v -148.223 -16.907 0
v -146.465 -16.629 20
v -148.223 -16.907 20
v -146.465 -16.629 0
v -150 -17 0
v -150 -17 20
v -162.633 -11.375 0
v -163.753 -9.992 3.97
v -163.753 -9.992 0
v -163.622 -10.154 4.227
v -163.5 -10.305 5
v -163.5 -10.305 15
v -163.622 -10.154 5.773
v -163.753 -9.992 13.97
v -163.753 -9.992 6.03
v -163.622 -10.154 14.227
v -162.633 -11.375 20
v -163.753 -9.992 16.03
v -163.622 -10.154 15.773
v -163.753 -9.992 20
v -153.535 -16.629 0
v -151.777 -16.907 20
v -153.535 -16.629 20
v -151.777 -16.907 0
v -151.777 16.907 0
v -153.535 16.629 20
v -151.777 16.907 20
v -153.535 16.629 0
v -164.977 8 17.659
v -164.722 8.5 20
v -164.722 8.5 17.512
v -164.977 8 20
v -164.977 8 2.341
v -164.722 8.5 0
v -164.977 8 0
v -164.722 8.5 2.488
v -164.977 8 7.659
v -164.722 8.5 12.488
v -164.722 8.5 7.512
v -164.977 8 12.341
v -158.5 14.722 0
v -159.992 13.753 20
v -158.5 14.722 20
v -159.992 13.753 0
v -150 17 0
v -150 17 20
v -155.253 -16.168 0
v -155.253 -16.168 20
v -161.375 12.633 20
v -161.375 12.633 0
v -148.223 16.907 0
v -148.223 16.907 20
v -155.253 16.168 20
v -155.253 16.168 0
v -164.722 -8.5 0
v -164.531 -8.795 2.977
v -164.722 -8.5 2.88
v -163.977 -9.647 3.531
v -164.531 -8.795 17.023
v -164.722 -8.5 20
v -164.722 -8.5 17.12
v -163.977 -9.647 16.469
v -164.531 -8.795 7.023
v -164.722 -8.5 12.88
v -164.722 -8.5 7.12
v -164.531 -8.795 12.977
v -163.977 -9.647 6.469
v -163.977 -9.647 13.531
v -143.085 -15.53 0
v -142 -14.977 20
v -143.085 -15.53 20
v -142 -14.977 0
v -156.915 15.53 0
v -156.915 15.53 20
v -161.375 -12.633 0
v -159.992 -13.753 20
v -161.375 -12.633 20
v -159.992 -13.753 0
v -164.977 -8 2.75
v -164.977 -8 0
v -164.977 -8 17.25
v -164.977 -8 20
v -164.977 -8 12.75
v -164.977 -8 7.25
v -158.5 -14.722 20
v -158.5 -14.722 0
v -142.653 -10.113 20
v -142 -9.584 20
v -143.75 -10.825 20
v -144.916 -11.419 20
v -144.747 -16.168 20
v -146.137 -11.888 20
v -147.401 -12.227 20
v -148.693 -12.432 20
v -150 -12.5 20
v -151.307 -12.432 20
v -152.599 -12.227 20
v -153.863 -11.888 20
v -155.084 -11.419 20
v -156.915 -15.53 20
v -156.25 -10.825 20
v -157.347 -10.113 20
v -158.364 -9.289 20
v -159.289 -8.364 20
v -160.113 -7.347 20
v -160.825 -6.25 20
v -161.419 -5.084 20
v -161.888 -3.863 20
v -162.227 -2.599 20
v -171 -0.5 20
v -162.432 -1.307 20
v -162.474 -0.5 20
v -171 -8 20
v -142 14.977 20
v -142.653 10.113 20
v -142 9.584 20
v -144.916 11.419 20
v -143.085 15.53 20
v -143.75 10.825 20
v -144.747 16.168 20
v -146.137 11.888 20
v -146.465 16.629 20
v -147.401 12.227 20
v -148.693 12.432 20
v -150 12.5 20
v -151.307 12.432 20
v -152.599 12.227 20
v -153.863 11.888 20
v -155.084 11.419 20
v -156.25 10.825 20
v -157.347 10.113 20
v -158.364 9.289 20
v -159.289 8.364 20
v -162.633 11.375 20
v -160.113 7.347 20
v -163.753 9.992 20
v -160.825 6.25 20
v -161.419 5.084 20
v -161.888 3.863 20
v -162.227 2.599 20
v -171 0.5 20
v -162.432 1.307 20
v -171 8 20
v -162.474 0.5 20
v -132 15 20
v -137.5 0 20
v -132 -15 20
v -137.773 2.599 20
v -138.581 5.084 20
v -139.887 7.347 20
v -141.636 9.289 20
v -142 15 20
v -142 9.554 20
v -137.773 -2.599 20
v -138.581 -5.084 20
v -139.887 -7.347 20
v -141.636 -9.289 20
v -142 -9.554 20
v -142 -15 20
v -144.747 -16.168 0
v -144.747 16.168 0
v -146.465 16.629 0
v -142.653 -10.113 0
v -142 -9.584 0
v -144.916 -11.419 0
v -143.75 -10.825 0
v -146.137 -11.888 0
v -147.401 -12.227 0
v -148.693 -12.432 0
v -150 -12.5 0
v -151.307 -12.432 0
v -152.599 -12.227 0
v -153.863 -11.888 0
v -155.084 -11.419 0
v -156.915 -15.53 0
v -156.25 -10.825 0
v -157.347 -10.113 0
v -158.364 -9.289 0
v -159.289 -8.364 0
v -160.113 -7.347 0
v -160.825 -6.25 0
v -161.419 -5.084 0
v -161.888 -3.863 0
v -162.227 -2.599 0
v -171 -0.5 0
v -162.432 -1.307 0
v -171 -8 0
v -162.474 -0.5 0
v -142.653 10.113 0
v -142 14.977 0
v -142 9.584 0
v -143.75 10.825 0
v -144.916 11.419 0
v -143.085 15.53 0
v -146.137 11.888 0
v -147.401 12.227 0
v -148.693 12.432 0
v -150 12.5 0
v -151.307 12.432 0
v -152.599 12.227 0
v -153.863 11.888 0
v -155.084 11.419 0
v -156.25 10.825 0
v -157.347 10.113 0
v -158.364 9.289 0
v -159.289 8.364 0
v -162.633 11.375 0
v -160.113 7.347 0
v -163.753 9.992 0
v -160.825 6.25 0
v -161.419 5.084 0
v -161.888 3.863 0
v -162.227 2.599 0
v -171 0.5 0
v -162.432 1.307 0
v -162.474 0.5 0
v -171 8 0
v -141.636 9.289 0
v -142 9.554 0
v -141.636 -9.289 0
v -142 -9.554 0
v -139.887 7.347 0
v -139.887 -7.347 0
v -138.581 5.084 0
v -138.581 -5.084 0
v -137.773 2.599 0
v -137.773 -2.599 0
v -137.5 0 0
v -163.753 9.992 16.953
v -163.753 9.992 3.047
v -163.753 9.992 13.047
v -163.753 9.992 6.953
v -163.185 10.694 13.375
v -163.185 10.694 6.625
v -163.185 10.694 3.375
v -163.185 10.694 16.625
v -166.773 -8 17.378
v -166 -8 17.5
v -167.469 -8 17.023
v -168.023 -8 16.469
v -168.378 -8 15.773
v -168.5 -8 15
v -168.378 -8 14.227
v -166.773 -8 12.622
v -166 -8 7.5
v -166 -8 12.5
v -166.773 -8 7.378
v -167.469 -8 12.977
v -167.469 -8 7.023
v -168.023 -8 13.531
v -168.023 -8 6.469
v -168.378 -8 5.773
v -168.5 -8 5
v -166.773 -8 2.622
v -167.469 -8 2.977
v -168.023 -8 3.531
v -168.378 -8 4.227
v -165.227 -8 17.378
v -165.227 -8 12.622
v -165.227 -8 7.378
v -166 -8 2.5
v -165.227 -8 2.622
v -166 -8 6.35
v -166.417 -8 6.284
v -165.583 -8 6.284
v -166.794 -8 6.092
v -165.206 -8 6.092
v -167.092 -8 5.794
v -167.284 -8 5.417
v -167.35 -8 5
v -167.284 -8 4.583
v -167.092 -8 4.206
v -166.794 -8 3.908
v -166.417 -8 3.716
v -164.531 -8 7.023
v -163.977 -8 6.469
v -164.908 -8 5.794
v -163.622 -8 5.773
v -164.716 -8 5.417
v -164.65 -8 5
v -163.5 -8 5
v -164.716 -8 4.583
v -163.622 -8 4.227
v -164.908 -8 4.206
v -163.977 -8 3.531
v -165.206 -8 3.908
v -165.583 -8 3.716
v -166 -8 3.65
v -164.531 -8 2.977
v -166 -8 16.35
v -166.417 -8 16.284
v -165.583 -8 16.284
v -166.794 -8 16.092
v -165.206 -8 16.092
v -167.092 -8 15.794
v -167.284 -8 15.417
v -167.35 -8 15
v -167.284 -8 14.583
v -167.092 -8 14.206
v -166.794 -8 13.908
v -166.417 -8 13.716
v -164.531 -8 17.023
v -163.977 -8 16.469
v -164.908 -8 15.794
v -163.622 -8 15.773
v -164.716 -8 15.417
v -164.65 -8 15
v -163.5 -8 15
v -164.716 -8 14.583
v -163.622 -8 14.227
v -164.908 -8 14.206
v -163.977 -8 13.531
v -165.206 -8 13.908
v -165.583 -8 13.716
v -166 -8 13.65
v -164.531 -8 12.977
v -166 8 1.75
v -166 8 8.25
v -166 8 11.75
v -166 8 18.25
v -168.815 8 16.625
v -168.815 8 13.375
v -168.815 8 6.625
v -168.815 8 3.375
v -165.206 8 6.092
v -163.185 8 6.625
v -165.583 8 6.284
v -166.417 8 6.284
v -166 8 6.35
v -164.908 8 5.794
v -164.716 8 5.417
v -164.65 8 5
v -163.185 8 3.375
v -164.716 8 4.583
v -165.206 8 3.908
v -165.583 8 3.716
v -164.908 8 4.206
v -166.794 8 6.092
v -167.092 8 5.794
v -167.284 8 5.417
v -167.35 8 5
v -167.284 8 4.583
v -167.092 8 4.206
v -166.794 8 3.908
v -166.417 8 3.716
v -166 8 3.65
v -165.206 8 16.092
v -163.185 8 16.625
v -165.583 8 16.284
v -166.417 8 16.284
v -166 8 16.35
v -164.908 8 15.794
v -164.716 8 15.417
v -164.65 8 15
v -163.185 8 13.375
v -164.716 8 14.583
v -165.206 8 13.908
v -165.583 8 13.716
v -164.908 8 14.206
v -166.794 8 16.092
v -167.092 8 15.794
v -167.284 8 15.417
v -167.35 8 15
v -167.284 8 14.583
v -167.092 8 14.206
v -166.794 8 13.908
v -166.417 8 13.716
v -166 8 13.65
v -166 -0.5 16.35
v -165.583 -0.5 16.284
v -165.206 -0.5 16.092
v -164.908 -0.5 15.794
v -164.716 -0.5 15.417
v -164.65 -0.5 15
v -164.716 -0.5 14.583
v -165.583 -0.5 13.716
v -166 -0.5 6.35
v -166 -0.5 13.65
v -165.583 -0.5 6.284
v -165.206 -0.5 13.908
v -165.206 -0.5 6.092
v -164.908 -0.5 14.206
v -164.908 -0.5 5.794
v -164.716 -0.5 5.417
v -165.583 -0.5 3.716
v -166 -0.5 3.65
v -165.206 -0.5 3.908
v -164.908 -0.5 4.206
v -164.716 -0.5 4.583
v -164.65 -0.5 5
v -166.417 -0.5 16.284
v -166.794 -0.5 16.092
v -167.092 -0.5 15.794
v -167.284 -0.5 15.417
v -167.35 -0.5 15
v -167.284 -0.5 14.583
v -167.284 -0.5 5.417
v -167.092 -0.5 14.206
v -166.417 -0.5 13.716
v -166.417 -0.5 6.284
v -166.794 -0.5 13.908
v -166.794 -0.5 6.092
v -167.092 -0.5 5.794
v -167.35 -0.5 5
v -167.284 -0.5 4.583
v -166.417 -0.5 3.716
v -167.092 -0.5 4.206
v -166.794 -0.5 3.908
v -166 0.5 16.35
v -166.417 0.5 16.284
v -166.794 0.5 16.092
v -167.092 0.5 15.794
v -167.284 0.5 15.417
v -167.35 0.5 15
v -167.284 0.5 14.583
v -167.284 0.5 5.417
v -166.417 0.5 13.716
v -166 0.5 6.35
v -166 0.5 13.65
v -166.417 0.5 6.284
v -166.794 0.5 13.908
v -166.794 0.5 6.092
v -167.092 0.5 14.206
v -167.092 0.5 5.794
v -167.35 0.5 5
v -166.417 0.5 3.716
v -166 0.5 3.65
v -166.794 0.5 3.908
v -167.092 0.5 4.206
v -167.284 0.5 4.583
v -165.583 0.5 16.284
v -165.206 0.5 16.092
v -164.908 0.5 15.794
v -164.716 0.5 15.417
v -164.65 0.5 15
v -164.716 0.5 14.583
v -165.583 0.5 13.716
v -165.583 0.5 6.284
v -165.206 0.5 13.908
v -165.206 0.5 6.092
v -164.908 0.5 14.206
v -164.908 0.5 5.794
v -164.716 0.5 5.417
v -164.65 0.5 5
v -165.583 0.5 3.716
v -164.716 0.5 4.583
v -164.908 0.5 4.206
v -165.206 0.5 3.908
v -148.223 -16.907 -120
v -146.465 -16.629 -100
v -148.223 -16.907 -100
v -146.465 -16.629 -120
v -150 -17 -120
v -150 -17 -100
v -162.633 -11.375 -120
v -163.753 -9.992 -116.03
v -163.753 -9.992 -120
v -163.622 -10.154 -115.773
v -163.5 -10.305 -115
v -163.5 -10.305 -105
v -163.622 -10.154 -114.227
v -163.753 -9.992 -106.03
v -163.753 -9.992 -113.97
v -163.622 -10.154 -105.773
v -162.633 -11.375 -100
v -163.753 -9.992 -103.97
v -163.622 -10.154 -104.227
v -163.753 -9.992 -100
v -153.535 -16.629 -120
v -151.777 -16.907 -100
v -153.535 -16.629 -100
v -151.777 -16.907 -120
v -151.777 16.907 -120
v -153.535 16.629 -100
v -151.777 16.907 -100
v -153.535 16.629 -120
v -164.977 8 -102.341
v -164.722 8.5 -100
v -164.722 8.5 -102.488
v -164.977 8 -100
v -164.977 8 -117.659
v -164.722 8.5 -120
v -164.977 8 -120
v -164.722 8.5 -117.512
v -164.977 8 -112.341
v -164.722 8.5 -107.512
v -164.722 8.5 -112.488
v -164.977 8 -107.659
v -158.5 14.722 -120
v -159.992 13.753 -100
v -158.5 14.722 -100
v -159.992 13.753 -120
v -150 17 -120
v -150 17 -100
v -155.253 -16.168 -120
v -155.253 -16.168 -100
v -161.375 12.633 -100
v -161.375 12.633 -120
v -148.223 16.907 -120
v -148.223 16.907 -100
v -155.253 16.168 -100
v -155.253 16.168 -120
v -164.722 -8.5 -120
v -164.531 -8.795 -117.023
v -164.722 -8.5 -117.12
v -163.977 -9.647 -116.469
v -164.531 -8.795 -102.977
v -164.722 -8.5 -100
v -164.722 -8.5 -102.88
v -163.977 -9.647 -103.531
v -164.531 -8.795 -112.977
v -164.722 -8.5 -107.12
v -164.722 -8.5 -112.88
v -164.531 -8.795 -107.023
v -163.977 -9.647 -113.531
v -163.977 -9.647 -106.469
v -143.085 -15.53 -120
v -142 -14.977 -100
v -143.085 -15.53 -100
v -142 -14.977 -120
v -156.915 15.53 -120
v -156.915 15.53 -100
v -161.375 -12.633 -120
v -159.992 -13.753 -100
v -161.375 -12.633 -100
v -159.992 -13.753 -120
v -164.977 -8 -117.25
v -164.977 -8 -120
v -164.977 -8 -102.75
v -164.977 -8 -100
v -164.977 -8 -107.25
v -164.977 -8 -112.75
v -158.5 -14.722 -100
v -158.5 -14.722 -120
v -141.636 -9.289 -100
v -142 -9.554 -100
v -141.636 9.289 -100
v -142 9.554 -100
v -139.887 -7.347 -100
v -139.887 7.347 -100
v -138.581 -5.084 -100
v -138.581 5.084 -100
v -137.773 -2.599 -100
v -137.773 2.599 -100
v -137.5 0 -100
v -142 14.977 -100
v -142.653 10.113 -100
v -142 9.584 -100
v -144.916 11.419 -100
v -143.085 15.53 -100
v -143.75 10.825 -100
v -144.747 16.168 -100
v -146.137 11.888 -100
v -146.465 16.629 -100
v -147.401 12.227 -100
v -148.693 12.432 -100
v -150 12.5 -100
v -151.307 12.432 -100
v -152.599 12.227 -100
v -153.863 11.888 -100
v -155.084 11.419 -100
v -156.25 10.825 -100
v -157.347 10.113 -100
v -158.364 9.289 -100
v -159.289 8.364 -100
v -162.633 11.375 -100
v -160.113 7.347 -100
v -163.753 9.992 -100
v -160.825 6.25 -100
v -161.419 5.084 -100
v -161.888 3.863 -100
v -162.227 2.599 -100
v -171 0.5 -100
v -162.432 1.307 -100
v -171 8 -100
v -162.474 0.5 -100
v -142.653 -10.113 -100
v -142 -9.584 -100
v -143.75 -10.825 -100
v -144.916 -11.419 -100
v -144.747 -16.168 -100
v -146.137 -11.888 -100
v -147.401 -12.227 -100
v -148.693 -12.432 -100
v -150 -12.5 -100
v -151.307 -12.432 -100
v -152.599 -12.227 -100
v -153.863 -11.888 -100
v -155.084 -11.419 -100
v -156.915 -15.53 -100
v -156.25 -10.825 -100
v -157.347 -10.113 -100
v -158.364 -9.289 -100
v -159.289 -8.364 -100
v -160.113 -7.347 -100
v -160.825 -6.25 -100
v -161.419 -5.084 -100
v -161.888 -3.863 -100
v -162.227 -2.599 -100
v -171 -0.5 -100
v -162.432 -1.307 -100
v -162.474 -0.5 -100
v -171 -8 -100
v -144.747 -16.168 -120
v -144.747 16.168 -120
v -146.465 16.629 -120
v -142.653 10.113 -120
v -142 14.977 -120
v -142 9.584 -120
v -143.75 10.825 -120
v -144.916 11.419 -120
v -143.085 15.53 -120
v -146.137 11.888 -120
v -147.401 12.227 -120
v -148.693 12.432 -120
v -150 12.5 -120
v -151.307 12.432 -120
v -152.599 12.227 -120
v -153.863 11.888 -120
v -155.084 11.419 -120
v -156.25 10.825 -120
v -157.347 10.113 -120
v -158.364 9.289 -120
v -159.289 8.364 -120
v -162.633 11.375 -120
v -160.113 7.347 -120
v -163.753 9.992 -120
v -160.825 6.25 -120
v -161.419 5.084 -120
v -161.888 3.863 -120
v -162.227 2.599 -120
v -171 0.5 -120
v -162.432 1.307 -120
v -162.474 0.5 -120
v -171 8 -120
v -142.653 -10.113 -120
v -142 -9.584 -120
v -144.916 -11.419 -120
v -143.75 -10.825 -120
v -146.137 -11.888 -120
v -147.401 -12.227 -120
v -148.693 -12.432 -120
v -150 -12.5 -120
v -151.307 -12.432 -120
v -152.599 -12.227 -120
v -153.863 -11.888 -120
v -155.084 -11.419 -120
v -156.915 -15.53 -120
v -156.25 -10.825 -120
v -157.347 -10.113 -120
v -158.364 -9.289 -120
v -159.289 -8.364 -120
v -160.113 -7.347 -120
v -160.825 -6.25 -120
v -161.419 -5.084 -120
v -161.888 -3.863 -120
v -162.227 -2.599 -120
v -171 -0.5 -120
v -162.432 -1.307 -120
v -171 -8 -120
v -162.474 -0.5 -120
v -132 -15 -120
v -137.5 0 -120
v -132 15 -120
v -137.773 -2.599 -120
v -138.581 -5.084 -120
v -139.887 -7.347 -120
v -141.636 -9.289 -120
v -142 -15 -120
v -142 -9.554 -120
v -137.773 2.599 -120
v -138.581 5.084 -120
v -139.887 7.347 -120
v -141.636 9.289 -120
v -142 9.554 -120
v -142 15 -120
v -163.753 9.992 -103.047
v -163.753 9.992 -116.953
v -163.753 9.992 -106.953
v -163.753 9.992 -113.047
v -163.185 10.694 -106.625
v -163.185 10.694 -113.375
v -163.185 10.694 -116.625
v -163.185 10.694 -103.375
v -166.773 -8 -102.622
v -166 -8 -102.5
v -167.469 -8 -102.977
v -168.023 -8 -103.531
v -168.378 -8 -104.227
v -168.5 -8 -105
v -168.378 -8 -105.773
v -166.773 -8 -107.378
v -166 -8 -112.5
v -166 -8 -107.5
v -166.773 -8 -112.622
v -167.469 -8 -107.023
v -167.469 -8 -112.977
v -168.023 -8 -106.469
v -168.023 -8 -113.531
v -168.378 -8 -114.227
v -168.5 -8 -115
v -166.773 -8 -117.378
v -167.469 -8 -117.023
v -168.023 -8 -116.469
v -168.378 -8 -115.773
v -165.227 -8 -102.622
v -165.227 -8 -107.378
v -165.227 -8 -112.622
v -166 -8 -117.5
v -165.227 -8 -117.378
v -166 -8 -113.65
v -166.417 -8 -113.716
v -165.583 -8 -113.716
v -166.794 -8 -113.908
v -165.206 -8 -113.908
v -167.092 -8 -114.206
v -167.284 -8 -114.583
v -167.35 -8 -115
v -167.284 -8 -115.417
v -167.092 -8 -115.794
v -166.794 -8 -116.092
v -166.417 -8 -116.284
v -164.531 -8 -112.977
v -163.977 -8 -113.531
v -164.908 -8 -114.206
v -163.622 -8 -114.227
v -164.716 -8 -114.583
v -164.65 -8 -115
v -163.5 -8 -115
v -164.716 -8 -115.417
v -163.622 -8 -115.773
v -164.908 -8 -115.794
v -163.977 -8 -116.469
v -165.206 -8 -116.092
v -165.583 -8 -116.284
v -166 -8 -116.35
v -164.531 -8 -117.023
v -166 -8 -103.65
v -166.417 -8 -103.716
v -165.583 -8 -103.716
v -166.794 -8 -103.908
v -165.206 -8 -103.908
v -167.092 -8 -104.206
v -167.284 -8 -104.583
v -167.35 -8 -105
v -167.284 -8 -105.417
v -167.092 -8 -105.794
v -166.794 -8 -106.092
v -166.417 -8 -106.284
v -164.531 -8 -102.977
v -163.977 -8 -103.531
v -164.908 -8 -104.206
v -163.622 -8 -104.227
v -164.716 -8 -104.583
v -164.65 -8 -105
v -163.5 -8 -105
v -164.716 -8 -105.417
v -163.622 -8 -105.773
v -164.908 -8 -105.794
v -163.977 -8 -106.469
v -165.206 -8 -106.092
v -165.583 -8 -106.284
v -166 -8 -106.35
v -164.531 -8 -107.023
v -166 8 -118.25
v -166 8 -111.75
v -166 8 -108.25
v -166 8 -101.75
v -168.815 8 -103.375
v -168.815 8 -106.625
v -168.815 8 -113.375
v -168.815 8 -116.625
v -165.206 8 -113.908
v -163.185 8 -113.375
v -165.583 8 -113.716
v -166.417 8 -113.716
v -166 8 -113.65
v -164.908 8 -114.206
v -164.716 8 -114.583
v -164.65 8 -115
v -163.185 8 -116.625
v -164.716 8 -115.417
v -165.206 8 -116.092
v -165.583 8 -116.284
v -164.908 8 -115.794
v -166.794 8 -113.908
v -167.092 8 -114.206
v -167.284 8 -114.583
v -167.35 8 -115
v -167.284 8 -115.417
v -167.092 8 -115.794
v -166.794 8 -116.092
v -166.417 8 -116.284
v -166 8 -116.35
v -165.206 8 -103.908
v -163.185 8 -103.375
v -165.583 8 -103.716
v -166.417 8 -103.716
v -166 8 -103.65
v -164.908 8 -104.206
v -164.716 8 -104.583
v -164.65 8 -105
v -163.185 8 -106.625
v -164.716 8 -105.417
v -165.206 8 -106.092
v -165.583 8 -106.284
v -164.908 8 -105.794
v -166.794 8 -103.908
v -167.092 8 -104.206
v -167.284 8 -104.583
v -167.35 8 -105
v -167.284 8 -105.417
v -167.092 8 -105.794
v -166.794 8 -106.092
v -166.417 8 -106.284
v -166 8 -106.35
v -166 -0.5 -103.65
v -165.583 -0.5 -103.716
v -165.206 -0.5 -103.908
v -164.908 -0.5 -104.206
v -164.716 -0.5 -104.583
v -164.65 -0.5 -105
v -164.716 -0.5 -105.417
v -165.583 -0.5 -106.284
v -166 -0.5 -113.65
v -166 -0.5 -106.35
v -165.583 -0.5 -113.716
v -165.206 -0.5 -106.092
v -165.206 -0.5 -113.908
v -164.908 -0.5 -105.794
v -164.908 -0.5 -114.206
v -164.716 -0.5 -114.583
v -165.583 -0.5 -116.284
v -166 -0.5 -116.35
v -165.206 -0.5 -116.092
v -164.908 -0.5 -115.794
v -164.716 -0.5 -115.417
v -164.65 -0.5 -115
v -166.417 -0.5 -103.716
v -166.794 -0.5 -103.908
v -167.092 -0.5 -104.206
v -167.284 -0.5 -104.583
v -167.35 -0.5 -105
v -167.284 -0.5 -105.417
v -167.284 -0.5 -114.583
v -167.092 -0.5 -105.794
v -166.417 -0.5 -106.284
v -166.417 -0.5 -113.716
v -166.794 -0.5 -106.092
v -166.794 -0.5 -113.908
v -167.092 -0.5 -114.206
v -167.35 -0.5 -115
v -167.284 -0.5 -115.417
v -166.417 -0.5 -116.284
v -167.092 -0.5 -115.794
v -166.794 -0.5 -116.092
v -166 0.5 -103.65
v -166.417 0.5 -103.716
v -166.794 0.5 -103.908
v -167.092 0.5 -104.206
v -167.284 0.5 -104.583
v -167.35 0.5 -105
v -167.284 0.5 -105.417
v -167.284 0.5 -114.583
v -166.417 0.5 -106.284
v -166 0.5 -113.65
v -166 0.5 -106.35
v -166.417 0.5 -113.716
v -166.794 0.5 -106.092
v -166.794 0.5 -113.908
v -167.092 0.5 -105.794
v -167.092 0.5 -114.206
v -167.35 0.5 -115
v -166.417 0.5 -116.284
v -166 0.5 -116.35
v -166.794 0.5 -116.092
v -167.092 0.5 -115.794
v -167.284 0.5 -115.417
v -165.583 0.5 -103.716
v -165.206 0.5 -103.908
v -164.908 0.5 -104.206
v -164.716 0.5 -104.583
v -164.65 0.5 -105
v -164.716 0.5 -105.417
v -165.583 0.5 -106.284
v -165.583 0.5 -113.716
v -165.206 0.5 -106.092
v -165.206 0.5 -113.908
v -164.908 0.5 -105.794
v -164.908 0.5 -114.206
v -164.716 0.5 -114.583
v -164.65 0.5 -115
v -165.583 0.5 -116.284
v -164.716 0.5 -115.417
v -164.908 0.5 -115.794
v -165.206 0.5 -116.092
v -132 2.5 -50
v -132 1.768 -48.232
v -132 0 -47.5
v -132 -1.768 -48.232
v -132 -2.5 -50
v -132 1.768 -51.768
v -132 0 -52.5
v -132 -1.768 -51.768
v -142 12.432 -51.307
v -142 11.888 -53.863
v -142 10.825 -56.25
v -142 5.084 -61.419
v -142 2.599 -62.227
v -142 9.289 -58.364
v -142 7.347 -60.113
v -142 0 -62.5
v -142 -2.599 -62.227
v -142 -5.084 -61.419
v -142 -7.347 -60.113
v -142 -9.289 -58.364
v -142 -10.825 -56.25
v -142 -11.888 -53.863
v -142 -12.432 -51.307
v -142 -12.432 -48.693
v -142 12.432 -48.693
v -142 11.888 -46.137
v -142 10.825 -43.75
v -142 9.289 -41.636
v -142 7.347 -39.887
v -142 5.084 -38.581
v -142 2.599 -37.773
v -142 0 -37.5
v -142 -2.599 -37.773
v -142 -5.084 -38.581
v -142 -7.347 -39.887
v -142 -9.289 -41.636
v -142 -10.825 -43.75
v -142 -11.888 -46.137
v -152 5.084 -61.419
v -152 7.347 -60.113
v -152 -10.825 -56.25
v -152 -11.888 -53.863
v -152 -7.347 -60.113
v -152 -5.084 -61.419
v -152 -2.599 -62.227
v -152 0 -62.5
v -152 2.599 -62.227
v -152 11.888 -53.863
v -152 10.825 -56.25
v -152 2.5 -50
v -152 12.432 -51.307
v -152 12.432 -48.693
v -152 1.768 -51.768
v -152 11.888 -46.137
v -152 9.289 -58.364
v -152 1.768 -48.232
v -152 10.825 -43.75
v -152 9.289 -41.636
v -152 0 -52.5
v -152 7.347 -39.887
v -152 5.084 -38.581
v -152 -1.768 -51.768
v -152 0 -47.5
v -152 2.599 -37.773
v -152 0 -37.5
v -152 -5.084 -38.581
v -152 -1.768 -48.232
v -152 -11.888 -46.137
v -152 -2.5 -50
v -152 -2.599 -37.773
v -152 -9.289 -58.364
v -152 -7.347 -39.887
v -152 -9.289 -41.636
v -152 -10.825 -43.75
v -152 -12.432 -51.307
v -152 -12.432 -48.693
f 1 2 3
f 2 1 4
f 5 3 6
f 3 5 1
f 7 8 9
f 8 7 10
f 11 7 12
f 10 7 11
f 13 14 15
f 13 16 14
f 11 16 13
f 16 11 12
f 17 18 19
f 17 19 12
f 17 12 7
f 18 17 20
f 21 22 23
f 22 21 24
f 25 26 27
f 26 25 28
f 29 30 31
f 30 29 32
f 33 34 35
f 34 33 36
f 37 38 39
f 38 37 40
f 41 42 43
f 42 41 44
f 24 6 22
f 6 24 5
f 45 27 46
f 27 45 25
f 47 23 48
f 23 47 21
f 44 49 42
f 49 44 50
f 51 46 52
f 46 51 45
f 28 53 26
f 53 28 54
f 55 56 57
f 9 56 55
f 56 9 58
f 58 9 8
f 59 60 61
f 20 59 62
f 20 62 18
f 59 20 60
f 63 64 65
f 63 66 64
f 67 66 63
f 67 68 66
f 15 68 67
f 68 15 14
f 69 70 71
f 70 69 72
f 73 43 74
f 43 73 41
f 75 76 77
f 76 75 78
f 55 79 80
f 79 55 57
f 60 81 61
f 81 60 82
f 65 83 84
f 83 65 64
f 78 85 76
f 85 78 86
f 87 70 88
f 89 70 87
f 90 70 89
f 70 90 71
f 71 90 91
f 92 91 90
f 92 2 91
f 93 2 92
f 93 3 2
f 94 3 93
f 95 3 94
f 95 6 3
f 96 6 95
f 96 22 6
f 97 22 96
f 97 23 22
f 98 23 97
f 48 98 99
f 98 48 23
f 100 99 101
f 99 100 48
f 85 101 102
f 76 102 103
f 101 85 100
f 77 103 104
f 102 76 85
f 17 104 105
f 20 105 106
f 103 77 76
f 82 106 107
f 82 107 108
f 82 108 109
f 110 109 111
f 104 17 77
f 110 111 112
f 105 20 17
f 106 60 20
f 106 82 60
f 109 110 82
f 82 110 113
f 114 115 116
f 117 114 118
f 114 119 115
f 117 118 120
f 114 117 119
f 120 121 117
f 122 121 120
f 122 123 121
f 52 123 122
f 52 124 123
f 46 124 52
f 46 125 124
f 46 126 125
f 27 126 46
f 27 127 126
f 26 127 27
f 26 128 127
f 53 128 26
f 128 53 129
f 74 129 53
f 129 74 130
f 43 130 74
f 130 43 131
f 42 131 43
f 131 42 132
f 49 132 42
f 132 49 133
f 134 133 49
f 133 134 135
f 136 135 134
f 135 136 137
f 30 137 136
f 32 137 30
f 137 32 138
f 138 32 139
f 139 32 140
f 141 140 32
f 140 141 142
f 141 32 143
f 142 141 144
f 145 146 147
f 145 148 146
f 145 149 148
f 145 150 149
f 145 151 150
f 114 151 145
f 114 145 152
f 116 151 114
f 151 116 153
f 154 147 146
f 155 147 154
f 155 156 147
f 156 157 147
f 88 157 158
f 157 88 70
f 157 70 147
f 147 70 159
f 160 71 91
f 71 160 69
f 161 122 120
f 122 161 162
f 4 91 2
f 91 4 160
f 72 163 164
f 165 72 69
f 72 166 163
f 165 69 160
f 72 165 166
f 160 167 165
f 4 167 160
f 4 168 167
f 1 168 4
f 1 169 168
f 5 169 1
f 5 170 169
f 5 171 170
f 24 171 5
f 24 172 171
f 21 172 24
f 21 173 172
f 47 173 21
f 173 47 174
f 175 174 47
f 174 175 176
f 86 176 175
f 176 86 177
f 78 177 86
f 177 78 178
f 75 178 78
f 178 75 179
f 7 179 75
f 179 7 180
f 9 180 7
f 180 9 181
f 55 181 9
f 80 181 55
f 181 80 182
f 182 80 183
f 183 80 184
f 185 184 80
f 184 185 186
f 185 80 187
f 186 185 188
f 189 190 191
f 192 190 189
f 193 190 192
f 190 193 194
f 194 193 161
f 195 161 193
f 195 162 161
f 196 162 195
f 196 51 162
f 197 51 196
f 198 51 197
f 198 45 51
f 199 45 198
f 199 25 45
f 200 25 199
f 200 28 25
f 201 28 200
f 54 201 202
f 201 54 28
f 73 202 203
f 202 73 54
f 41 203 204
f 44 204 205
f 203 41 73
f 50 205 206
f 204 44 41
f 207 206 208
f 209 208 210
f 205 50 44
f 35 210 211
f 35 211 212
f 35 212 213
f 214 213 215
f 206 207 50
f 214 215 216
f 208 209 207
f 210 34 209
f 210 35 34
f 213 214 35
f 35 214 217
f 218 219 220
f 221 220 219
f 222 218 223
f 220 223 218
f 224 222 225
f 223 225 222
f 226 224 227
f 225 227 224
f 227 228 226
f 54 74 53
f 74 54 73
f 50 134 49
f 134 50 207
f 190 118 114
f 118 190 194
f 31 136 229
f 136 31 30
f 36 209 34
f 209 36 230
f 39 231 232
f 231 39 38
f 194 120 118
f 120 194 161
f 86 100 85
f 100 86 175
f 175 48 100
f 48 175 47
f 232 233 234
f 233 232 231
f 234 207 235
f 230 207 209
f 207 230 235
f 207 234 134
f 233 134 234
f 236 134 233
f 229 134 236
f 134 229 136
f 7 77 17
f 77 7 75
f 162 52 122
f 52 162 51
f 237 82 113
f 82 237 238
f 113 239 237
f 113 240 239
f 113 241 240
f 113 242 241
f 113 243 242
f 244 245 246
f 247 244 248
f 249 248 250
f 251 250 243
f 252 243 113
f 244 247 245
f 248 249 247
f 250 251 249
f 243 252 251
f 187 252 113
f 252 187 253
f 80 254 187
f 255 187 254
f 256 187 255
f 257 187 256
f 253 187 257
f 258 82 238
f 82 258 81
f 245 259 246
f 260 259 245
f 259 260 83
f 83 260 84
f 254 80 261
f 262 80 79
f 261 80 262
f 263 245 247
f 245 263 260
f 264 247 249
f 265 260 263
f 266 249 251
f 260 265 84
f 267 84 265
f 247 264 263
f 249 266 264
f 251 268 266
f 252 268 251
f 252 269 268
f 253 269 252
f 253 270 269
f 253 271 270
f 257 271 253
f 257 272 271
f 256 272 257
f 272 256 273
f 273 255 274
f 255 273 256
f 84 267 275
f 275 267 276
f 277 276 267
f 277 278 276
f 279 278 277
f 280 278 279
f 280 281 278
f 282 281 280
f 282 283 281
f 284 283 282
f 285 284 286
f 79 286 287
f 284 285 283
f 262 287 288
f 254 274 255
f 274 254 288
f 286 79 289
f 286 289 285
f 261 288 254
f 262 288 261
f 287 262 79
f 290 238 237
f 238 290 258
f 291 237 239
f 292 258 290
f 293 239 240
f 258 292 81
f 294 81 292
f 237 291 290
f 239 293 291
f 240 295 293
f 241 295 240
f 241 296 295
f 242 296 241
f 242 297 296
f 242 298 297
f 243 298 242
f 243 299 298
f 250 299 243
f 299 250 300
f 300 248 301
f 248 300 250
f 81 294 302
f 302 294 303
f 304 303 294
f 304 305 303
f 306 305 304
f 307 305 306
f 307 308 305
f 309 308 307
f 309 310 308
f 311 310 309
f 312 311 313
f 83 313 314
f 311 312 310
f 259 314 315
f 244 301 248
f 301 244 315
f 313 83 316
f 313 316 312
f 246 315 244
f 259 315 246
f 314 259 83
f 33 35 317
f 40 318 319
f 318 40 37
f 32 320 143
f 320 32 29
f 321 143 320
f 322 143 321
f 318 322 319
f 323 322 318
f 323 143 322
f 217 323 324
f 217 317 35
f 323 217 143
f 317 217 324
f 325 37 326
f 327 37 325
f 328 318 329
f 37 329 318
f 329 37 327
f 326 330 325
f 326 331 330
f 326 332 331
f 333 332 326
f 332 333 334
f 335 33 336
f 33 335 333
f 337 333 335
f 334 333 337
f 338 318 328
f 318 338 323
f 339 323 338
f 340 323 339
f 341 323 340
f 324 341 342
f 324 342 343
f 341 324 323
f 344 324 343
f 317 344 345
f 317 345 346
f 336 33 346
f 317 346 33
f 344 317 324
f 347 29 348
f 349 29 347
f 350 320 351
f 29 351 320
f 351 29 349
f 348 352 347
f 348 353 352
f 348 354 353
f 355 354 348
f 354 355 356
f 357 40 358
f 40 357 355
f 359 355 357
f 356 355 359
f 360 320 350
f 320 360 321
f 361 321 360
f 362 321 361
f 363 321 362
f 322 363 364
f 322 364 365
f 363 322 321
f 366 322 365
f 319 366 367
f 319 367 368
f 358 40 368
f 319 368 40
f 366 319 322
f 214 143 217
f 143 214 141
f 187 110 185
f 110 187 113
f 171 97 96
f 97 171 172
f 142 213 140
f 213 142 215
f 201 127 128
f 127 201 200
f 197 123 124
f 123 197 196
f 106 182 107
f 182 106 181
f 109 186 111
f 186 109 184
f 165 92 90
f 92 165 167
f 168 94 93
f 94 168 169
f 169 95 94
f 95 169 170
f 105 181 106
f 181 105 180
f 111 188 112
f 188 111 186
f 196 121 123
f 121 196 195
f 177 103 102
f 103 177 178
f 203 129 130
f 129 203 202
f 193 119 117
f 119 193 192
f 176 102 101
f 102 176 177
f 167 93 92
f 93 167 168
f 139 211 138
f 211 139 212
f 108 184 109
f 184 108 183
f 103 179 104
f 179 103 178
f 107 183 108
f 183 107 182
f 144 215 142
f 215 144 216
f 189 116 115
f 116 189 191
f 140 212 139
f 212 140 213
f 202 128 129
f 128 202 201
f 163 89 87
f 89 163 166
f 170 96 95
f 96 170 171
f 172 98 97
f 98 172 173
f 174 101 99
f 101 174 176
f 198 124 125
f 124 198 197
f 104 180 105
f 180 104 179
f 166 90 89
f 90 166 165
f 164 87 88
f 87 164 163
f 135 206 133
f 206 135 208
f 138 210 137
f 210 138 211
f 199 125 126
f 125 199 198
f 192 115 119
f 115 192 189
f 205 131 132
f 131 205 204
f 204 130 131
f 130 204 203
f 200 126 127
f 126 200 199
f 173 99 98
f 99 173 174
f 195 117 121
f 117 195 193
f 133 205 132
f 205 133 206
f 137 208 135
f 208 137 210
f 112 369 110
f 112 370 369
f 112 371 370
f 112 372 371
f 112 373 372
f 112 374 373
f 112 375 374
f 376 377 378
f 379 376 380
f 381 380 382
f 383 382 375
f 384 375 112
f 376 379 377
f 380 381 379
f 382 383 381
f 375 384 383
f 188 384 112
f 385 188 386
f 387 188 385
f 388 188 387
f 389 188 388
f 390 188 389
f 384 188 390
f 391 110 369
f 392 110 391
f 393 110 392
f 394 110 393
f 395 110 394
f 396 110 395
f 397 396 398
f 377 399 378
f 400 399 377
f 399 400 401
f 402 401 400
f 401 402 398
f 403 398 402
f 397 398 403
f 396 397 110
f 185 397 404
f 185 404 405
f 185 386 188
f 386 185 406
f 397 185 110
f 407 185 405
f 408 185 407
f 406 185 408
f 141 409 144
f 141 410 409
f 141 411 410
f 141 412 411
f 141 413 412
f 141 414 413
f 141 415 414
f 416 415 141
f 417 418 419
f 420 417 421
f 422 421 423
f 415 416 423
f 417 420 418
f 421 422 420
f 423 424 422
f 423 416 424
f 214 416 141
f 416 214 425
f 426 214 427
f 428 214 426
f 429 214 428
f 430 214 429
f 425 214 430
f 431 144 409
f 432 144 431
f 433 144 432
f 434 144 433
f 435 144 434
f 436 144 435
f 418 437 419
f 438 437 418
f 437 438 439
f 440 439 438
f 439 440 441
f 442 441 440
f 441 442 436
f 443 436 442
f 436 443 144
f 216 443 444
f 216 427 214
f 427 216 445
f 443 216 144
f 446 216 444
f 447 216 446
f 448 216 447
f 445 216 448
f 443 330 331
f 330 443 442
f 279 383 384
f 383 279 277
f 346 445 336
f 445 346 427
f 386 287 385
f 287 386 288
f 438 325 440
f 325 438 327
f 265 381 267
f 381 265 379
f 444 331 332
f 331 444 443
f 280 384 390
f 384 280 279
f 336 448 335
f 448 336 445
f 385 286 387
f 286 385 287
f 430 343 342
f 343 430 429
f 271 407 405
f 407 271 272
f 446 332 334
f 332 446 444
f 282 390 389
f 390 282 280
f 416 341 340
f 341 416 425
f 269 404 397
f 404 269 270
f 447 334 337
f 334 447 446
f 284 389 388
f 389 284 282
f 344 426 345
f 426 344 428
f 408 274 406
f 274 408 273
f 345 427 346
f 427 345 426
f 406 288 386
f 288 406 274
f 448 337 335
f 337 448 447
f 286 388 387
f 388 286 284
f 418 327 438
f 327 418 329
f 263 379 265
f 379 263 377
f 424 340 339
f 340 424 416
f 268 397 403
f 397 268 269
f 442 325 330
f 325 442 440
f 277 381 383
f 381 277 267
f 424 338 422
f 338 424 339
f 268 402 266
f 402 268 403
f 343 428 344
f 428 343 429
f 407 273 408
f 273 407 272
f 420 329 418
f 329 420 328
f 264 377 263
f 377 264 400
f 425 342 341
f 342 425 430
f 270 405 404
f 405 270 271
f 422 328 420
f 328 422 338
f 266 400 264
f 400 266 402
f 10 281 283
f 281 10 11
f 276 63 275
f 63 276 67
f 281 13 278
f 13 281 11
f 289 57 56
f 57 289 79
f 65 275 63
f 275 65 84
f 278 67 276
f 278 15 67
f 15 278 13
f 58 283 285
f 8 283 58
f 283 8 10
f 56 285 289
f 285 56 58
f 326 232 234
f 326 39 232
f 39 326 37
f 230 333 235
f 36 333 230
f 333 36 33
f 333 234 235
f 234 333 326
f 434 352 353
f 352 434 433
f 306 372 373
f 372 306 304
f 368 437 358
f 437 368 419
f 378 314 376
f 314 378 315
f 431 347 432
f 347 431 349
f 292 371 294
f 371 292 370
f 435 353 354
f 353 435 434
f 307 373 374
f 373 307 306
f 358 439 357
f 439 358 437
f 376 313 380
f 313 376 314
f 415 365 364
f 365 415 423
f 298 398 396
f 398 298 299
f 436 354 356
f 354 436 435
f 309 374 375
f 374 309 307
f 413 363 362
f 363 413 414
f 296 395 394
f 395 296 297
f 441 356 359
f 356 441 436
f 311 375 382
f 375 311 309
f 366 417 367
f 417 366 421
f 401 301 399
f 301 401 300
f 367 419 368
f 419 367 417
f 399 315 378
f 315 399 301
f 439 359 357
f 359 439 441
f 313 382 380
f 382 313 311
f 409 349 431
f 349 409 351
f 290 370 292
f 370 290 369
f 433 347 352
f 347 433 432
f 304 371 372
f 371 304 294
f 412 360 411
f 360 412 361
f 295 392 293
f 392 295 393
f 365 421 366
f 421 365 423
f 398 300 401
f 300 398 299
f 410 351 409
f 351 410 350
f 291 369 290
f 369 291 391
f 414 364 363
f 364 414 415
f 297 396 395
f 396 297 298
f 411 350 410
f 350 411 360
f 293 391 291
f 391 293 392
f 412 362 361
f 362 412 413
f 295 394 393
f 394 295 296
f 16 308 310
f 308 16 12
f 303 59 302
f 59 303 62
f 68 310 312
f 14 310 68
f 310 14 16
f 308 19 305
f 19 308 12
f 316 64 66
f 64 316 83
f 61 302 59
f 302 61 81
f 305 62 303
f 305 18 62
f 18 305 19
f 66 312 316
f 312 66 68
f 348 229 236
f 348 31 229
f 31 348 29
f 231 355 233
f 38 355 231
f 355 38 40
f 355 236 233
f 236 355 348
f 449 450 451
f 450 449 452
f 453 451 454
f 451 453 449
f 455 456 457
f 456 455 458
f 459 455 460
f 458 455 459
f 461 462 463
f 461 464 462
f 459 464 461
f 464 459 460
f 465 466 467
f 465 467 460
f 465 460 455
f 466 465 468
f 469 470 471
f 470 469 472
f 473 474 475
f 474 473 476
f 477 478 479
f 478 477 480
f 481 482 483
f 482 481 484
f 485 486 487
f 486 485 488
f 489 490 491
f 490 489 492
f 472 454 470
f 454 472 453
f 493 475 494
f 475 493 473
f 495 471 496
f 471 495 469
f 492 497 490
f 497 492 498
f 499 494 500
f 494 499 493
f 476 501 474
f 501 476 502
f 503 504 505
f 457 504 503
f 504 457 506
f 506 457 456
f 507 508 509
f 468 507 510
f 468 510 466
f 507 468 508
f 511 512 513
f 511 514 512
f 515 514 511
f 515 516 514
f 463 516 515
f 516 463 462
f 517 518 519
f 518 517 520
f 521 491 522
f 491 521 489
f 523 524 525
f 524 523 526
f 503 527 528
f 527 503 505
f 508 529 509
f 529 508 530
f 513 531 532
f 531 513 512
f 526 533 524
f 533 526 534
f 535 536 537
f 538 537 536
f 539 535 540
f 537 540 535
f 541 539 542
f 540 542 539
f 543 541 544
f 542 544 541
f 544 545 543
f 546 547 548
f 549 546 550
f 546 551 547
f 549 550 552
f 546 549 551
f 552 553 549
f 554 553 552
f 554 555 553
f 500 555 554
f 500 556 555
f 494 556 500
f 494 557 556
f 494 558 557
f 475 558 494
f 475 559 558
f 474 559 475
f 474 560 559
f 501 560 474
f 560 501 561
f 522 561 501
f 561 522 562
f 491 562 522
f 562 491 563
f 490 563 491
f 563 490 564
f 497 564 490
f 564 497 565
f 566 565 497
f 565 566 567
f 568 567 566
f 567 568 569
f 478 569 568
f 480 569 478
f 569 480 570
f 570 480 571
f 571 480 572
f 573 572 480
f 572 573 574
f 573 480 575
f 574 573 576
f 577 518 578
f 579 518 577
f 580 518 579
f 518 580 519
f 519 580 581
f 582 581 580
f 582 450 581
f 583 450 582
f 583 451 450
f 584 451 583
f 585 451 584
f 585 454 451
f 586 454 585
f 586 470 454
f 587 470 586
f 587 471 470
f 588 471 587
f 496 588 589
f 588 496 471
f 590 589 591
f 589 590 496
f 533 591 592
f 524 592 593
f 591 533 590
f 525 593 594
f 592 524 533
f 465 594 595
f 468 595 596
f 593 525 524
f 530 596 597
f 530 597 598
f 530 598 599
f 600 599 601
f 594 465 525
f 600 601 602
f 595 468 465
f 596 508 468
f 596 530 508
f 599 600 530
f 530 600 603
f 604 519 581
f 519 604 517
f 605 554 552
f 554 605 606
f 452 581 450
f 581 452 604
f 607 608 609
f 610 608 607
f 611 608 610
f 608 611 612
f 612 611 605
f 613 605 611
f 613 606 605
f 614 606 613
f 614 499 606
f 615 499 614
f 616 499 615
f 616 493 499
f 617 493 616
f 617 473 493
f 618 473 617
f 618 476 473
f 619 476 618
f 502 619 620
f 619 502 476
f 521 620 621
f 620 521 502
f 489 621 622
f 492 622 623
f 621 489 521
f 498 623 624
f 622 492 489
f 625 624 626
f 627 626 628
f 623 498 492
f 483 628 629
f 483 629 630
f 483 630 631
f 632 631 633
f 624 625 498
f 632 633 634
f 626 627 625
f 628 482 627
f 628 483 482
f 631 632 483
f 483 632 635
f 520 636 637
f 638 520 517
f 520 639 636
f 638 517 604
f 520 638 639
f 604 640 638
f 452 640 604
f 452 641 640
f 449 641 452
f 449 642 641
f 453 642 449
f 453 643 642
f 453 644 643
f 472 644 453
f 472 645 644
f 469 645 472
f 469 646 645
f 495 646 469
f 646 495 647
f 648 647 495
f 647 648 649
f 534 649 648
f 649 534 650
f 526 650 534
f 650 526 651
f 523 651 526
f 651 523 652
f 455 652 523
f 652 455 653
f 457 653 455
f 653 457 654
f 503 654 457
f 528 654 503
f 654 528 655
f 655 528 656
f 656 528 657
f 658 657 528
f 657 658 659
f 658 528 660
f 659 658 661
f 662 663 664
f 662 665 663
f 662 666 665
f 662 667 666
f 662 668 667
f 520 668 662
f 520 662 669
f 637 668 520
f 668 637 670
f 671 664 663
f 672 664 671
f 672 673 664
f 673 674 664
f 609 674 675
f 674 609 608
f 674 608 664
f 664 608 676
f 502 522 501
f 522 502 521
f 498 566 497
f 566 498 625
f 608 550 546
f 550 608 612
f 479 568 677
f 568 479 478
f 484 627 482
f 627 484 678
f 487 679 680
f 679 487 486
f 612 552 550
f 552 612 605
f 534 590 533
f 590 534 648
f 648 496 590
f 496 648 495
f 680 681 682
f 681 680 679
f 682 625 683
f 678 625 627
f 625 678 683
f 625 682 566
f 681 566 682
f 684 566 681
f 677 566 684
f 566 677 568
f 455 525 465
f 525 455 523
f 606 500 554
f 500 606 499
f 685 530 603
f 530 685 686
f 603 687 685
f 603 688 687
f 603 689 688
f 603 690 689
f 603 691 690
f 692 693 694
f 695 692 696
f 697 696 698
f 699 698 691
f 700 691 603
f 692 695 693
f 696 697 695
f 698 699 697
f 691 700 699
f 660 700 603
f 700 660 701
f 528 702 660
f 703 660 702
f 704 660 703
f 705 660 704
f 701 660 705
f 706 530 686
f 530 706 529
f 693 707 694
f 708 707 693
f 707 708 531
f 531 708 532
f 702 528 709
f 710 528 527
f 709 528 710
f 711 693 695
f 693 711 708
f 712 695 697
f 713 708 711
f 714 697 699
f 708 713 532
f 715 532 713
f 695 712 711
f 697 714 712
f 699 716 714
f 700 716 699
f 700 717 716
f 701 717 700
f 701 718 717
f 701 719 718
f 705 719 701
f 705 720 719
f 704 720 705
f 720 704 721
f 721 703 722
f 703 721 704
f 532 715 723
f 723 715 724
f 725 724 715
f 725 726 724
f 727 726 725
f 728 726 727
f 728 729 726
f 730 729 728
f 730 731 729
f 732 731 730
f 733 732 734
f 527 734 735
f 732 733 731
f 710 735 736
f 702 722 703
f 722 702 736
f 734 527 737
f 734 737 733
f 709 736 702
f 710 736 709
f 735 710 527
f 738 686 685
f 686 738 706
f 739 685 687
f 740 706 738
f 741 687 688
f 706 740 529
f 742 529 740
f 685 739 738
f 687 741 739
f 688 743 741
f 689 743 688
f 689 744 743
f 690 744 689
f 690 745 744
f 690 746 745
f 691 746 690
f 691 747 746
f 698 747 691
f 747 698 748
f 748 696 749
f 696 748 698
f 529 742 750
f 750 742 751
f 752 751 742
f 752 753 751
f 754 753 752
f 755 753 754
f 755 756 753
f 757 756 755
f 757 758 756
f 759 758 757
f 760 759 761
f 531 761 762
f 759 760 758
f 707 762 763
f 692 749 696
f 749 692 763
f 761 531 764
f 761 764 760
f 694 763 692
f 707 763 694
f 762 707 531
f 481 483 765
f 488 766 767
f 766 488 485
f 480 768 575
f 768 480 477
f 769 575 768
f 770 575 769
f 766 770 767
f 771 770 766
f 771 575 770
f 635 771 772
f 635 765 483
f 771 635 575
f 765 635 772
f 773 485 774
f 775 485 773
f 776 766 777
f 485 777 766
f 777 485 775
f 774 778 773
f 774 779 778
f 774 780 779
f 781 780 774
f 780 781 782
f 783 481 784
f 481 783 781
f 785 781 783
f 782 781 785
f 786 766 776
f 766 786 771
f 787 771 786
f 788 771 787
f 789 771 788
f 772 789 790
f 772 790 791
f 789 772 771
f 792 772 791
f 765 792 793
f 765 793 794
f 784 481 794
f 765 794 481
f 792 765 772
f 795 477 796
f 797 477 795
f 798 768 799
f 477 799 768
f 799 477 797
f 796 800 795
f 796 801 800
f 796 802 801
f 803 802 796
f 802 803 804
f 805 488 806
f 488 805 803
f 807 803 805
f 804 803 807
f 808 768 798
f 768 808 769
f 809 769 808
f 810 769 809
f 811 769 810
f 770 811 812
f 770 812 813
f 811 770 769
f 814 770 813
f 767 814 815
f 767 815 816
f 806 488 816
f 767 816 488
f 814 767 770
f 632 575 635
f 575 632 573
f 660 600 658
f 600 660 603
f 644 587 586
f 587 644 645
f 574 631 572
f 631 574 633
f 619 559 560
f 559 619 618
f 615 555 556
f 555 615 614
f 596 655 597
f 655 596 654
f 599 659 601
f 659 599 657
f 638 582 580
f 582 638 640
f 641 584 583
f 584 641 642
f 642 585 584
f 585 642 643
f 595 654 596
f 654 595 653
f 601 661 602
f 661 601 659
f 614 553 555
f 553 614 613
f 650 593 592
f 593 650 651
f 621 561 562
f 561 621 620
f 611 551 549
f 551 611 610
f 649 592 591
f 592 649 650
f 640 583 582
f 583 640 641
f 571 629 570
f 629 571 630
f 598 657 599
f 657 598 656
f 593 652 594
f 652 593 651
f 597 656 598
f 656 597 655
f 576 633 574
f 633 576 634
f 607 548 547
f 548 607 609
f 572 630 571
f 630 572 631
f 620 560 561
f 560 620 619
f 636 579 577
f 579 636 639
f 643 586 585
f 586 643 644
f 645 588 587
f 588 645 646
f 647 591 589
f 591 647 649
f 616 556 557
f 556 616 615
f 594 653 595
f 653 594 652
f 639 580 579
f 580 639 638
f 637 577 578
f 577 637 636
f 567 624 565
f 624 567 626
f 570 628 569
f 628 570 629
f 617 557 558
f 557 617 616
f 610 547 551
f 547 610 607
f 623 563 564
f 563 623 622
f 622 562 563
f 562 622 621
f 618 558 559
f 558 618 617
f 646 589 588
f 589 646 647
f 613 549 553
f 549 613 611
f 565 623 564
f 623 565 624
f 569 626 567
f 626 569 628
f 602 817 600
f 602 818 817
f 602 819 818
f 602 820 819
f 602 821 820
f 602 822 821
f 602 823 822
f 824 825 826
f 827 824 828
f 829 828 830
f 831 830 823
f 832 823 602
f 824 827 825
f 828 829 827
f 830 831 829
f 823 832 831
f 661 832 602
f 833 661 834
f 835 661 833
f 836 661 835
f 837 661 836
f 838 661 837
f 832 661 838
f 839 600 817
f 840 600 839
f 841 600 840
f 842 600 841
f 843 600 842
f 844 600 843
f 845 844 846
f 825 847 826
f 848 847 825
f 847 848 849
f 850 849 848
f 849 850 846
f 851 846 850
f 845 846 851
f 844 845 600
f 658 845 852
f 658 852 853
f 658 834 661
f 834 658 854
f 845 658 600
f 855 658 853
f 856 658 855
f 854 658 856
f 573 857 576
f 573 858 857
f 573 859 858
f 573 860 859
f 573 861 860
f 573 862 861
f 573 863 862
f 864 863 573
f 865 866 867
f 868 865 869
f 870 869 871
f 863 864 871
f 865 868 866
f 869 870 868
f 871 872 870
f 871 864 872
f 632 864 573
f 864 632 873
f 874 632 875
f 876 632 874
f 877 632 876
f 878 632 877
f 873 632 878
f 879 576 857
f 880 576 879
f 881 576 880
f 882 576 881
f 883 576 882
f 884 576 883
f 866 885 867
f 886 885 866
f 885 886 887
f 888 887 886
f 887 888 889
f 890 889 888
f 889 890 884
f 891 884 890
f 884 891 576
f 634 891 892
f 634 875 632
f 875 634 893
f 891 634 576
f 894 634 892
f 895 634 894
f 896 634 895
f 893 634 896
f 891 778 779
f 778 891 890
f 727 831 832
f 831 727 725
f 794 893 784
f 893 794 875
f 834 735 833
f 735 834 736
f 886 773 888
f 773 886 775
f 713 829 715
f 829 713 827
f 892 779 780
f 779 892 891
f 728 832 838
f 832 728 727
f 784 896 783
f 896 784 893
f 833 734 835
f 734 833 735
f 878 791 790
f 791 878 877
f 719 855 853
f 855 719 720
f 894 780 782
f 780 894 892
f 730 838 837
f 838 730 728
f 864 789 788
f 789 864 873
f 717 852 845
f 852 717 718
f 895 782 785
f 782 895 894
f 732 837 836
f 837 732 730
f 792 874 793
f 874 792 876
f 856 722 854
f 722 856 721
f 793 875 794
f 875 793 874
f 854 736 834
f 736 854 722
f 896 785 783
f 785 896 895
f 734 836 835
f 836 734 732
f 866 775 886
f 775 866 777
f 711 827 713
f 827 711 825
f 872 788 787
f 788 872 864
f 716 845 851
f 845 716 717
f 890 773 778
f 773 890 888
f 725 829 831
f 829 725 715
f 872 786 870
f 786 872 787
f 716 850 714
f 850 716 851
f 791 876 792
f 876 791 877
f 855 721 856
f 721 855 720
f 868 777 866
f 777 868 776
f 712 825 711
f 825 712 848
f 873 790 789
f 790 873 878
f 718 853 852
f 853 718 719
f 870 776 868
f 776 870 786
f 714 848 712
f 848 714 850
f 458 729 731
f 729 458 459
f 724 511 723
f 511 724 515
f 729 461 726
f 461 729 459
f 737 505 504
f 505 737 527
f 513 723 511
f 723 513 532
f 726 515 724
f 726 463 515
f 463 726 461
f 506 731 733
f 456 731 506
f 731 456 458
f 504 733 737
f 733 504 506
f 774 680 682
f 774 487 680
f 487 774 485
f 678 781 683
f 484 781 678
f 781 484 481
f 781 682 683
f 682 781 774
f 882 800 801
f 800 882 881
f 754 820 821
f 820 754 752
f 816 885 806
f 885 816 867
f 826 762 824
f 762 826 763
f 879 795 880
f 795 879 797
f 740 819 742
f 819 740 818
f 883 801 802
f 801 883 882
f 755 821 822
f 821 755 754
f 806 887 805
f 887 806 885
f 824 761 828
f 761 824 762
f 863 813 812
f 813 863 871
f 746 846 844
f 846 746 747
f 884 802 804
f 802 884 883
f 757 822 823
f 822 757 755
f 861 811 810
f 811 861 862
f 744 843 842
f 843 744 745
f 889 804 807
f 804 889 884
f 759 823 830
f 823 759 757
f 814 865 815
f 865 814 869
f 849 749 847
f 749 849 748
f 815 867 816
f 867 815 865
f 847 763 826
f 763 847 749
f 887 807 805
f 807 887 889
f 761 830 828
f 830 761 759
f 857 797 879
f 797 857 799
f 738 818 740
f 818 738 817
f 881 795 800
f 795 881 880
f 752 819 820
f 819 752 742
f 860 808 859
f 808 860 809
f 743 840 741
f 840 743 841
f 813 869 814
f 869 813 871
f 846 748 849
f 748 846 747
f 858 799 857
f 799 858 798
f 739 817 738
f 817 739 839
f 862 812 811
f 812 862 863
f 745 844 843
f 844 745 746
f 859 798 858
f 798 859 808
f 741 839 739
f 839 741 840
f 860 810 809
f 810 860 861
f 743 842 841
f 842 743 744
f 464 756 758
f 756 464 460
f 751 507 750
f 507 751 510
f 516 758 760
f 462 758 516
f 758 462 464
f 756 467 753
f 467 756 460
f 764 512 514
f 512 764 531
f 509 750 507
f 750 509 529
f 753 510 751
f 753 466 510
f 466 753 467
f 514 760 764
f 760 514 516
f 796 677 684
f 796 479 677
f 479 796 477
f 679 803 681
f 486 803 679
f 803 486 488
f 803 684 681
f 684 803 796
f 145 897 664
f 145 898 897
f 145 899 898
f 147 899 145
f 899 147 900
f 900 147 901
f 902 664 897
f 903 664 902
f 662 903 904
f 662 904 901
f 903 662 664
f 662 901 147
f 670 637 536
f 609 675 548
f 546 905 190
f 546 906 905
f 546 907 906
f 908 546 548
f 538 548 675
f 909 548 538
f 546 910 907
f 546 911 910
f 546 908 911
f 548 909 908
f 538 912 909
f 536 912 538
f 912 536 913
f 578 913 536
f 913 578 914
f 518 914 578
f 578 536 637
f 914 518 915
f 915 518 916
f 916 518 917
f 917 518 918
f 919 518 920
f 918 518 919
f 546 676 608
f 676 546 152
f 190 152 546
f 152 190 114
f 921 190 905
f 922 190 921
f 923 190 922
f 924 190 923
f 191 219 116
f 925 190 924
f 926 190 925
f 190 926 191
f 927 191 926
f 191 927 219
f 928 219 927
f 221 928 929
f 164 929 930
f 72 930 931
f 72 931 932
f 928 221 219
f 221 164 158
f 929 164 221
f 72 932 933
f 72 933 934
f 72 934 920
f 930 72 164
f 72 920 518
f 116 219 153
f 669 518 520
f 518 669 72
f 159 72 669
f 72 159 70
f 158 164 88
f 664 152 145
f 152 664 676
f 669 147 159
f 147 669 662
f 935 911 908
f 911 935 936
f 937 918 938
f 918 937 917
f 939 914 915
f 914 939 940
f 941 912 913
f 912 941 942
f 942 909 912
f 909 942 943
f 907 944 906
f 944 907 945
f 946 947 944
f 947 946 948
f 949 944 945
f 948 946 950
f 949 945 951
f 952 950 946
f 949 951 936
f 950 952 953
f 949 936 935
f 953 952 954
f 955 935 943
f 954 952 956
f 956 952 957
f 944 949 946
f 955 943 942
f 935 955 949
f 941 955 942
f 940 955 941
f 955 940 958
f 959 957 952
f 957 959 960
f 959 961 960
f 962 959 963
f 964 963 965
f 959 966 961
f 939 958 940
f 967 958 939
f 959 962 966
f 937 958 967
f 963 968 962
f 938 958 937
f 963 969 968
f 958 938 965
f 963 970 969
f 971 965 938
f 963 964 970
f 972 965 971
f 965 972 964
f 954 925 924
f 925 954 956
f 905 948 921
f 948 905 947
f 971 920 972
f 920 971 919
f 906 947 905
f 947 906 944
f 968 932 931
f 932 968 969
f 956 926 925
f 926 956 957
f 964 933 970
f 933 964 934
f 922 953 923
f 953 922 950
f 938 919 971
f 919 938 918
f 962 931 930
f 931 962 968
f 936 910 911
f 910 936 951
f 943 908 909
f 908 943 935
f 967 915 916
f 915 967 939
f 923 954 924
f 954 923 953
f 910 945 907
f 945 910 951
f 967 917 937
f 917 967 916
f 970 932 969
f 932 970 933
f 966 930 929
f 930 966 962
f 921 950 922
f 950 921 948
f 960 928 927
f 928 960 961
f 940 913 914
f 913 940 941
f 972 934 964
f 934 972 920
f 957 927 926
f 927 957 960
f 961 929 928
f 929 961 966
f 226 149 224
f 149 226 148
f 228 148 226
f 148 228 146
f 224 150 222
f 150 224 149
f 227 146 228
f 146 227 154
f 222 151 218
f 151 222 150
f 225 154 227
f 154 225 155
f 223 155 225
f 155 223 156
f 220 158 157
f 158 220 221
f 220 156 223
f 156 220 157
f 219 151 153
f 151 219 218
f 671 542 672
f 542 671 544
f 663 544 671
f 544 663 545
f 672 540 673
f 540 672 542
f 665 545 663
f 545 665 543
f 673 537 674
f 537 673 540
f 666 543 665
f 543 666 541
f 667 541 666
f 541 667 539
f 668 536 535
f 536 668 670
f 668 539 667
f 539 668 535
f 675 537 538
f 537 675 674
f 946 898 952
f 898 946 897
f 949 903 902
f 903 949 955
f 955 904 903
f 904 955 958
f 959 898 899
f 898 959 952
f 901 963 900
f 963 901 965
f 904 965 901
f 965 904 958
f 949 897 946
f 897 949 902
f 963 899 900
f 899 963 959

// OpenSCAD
translate([-150,0,0])rotate([0,0,-90])bracelet();
translate([-150,0,-120])rotate([0,0,-90])bracelet();
difference(){
union(){    
translate([-142,-15,-120])cube([10,30,140]);
translate([-152,0,-50])rotate([0,90,0])
    cylinder(d=25,h=20);
}
translate([-150,0,0])cylinder(d=25,h=22);
translate([-150,0,-122])cylinder(d=25,h=22);
translate([-160,0,-50])rotate([0,90,0])
    cylinder(d=5,h=50);
}

module bracelet(){
$fn=20;
difference(){
union(){
cylinder(d=34,h=20,$fn=60);
translate([-8,-21,0])cube(size=[16,8,20]);
}
translate([0,0,-1]) cylinder(d=25,h=22,$fn=60);
translate([-.5,-25,-1])cube(size=[1,20,22]);

translate ([-15,-16,5])rotate([0,90,0])
cylinder(d=2.7,h=100);
translate ([8,-16,5])rotate([0,90,0])
cylinder(d=5,h=100);
translate ([-18,-16,5])rotate([0,90,0])
cylinder(d=6.5,h=10,$fn=6);

translate ([-15,-16,15])rotate([0,90,0])
cylinder(d=2.7,h=100);
translate ([8,-16,15])rotate([0,90,0])
cylinder(d=5,h=100);
translate ([-18,-16,15])rotate([0,90,0])
cylinder(d=6.5,h=10,$fn=6);
}
}
